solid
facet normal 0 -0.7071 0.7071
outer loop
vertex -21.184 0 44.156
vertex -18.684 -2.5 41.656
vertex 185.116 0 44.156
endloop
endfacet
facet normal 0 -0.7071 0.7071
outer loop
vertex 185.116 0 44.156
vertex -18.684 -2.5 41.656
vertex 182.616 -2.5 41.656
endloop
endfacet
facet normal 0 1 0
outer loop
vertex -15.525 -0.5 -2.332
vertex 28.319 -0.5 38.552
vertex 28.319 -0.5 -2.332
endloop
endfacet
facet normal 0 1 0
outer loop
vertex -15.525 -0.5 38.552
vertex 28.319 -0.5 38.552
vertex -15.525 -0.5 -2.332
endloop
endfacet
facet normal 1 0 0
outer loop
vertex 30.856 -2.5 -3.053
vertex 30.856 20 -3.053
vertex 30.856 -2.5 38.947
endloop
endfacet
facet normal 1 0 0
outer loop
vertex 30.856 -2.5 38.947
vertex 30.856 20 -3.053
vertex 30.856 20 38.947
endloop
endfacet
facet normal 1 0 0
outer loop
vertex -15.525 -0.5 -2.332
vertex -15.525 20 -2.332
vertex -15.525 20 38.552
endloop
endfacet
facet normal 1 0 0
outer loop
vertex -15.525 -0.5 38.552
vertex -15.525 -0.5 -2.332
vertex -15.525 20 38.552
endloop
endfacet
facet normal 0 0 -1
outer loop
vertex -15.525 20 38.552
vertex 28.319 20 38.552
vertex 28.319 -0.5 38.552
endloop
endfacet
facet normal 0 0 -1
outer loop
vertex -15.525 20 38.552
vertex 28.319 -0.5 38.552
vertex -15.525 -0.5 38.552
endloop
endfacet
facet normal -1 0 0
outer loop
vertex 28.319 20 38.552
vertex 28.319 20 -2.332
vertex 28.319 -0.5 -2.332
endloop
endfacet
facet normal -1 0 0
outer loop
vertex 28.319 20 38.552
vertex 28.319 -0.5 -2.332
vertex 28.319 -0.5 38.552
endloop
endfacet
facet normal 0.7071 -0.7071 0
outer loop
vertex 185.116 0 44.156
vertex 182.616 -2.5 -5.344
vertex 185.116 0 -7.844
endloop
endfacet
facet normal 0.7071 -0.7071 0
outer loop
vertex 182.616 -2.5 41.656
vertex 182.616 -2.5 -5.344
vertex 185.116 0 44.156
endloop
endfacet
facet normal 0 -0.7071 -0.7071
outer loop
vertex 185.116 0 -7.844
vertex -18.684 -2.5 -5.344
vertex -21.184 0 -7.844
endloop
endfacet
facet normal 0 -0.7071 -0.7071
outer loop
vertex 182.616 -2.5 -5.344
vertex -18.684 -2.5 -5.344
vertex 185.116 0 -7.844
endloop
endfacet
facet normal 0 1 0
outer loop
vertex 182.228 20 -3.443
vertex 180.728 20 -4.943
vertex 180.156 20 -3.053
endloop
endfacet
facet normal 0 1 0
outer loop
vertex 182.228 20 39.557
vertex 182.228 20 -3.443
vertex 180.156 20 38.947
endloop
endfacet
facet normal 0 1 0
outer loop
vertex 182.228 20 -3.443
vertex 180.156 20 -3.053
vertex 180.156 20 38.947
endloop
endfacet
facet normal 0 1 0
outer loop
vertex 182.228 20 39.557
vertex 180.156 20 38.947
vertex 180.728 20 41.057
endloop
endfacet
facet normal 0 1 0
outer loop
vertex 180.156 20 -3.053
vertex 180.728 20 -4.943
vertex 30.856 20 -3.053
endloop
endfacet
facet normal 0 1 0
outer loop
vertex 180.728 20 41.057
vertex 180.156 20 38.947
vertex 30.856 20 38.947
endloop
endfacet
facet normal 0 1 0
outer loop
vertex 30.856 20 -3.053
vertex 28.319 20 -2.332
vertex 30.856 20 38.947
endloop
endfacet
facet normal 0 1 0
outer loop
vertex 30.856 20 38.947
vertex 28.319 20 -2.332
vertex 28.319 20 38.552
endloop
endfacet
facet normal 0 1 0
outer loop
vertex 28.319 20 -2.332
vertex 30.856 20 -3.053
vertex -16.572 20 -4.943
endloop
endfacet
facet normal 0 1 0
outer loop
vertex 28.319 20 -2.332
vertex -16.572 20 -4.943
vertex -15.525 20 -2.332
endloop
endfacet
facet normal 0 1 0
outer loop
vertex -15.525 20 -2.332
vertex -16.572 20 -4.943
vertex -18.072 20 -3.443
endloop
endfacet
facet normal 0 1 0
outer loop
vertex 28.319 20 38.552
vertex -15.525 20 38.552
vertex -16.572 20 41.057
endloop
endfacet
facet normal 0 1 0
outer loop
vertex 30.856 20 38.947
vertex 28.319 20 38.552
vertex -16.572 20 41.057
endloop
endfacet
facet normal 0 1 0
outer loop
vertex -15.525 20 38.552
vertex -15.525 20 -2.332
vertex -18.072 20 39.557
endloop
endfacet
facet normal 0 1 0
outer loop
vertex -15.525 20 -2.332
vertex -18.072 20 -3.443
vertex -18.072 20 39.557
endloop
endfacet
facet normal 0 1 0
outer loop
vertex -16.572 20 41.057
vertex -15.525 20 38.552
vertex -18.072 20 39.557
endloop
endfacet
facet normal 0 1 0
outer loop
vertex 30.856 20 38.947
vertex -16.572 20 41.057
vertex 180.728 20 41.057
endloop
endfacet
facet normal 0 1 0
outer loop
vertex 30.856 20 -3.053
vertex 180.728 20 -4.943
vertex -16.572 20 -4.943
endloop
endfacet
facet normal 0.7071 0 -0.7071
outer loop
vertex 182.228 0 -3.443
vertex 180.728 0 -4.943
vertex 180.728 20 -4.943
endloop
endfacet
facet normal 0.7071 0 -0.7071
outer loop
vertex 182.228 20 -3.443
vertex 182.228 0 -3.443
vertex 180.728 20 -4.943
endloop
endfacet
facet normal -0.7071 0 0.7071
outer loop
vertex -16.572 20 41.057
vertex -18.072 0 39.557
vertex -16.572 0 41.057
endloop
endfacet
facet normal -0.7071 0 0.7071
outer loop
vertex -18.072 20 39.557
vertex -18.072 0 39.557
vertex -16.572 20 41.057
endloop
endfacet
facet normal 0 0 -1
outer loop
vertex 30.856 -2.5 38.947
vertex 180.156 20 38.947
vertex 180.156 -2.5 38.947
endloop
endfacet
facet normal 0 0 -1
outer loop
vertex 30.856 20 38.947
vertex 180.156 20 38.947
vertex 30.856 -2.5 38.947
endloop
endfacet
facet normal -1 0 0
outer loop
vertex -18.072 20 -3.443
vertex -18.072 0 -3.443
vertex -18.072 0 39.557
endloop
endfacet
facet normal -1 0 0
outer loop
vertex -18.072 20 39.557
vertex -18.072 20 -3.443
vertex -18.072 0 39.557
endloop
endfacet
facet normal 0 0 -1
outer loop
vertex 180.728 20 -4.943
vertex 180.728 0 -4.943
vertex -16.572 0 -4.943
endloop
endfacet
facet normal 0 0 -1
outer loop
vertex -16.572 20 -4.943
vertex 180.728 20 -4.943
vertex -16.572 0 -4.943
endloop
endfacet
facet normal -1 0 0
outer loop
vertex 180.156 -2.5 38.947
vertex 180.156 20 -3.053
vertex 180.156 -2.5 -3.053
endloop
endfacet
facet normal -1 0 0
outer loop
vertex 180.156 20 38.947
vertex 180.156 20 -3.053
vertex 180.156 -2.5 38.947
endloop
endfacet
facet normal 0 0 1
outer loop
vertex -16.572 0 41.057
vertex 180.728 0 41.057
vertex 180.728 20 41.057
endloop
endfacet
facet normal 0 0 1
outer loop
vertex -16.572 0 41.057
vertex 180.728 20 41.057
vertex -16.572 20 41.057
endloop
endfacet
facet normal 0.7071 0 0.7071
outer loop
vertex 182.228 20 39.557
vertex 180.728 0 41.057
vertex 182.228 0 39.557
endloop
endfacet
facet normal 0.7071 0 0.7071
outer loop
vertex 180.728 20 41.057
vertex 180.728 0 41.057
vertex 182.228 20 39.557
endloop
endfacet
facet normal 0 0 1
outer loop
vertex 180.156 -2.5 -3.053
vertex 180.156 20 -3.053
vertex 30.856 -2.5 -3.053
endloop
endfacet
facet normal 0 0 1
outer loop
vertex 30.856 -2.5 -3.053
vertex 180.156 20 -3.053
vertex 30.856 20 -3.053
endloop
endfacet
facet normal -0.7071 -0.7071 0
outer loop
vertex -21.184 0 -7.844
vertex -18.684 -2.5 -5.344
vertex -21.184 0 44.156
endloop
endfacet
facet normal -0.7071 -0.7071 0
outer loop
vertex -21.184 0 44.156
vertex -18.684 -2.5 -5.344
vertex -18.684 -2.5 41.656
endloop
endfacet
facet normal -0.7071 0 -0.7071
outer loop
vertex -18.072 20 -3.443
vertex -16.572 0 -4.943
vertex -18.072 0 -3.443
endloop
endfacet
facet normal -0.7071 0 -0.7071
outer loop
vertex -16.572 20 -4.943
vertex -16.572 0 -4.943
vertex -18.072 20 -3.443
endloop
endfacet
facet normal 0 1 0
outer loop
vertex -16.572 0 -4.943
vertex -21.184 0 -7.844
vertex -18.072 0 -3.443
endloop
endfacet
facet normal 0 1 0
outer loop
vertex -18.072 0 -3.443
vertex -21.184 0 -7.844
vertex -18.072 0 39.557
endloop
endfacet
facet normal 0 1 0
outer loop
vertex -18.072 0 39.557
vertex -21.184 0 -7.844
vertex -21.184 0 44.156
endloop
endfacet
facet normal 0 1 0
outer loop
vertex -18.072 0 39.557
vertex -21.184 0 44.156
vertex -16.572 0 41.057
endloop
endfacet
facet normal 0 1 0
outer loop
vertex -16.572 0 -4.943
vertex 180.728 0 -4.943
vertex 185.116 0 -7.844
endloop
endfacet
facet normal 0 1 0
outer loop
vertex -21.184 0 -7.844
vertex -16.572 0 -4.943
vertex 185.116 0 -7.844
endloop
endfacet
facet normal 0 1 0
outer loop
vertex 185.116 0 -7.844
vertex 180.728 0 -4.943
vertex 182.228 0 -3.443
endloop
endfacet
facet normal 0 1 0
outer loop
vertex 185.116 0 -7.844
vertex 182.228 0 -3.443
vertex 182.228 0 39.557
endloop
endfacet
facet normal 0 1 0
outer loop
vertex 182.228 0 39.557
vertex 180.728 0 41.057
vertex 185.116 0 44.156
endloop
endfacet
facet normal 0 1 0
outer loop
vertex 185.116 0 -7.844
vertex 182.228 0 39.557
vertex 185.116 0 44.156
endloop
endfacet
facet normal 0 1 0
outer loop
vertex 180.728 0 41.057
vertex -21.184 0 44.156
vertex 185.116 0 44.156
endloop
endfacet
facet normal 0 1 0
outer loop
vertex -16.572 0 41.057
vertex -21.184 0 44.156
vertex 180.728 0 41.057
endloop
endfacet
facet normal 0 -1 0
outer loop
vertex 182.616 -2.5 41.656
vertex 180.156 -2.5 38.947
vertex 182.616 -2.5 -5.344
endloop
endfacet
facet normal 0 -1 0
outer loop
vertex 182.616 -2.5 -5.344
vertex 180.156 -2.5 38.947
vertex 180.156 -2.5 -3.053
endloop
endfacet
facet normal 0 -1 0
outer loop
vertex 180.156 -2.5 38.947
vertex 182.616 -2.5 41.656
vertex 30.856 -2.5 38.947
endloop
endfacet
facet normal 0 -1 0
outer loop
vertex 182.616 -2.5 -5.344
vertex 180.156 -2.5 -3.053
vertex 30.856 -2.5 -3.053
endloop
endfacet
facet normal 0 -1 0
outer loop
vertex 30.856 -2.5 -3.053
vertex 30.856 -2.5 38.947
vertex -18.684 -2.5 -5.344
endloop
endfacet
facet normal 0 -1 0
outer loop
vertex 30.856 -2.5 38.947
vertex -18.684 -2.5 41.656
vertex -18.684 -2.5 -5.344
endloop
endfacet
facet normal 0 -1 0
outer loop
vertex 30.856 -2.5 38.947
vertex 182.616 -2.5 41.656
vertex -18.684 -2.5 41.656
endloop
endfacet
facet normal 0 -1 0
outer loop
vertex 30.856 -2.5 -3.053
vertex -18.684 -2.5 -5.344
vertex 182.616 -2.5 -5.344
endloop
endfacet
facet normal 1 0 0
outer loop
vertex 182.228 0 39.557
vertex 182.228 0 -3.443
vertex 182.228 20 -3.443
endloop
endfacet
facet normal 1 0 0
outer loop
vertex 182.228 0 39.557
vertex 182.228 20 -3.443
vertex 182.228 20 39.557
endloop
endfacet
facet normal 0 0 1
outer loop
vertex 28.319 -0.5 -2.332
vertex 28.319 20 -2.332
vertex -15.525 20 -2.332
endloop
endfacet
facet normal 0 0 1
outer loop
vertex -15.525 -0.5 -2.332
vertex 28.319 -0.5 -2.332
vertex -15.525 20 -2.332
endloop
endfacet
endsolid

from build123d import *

# Parameters (mm, degrees)
F0_W      = 206.3
F0_H      = 52
F1_DEPTH  = 2.5
F2_SIZE   = 2.49999
F3_W      = 200.3
F3_H      = 46
F4_DEPTH  = 20
F5_W      = 196.3
F5_H      = 42
F6_DEPTH  = 25
F7_SIZE   = 1.5
F8_DEPTH  = 47
F9_W      = 43.8446728513
F9_H      = 40.8840479795
F10_DEPTH = 20.5


# Not quite as in the source:
# - a fillet or chamfer is up to 0.001 mm smaller than in the source, because OpenCascade refuses the exact size


with BuildPart() as f1:
    # F0 (on Front) → F1 (new body)
    with BuildSketch(Plane.XZ):
        with Locations((81.9657886937, 18.1555162981)):
            Rectangle(F0_W, F0_H)
    extrude(amount=F1_DEPTH)

    # F2 (size 2.5 in the source; OpenCascade refuses exactly that, so slightly less here)
    f2_edges = [f1.edges().sort_by_distance(p)[0] for p in [
        (81.965789, -2.5, 44.155516),
        (81.965789, -2.5, -7.844484),
        (185.115789, -2.5, 18.155516),
        (-21.184211, -2.5, 18.155516),
    ]]
    chamfer(f2_edges, length=F2_SIZE)

    # F3 (on face) → F4 (join)
    with BuildSketch(Plane(origin=(0, 0, 0), x_dir=(-1, 0, 0), z_dir=(0, 1, 0))):
        with Locations((-82.0777288884, 18.0567920078)):
            Rectangle(F3_W, F3_H)
    extrude(amount=F4_DEPTH)

    # F5 (on face) → F6 (cut)
    with BuildSketch(Plane(origin=(0, 20, 0), x_dir=(-1, 0, 0), z_dir=(0, 1, 0))):
        with Locations((-82.0056978608, 17.9472315861)):
            Rectangle(F5_W, F5_H)
    extrude(amount=-F6_DEPTH, mode=Mode.SUBTRACT)

    # F7
    f7_edges = [f1.edges().sort_by_distance(p)[0] for p in [
        (182.227729, 10, 41.056792),
        (182.227729, 10, -4.943208),
        (-18.072271, 10, 41.056792),
        (-18.072271, 10, -4.943208),
    ]]
    chamfer(f7_edges, length=F7_SIZE)

    # F8 (add): a face of the model
    f8_faces = [f1.faces().sort_by_distance(p)[0] for p in [
        (-16.1443021392, 8.75, 17.9472315861),
    ]]
    extrude(f8_faces, amount=F8_DEPTH)

    # F9 (on face) → F10 (cut)
    with BuildSketch(Plane(origin=(0, 20, 0), x_dir=(-1, 0, 0), z_dir=(0, 1, 0))):
        with Locations((-6.3970577903, 18.1101224152)):
            Rectangle(F9_W, F9_H)
    extrude(amount=-F10_DEPTH, mode=Mode.SUBTRACT)


solid = f1.part
